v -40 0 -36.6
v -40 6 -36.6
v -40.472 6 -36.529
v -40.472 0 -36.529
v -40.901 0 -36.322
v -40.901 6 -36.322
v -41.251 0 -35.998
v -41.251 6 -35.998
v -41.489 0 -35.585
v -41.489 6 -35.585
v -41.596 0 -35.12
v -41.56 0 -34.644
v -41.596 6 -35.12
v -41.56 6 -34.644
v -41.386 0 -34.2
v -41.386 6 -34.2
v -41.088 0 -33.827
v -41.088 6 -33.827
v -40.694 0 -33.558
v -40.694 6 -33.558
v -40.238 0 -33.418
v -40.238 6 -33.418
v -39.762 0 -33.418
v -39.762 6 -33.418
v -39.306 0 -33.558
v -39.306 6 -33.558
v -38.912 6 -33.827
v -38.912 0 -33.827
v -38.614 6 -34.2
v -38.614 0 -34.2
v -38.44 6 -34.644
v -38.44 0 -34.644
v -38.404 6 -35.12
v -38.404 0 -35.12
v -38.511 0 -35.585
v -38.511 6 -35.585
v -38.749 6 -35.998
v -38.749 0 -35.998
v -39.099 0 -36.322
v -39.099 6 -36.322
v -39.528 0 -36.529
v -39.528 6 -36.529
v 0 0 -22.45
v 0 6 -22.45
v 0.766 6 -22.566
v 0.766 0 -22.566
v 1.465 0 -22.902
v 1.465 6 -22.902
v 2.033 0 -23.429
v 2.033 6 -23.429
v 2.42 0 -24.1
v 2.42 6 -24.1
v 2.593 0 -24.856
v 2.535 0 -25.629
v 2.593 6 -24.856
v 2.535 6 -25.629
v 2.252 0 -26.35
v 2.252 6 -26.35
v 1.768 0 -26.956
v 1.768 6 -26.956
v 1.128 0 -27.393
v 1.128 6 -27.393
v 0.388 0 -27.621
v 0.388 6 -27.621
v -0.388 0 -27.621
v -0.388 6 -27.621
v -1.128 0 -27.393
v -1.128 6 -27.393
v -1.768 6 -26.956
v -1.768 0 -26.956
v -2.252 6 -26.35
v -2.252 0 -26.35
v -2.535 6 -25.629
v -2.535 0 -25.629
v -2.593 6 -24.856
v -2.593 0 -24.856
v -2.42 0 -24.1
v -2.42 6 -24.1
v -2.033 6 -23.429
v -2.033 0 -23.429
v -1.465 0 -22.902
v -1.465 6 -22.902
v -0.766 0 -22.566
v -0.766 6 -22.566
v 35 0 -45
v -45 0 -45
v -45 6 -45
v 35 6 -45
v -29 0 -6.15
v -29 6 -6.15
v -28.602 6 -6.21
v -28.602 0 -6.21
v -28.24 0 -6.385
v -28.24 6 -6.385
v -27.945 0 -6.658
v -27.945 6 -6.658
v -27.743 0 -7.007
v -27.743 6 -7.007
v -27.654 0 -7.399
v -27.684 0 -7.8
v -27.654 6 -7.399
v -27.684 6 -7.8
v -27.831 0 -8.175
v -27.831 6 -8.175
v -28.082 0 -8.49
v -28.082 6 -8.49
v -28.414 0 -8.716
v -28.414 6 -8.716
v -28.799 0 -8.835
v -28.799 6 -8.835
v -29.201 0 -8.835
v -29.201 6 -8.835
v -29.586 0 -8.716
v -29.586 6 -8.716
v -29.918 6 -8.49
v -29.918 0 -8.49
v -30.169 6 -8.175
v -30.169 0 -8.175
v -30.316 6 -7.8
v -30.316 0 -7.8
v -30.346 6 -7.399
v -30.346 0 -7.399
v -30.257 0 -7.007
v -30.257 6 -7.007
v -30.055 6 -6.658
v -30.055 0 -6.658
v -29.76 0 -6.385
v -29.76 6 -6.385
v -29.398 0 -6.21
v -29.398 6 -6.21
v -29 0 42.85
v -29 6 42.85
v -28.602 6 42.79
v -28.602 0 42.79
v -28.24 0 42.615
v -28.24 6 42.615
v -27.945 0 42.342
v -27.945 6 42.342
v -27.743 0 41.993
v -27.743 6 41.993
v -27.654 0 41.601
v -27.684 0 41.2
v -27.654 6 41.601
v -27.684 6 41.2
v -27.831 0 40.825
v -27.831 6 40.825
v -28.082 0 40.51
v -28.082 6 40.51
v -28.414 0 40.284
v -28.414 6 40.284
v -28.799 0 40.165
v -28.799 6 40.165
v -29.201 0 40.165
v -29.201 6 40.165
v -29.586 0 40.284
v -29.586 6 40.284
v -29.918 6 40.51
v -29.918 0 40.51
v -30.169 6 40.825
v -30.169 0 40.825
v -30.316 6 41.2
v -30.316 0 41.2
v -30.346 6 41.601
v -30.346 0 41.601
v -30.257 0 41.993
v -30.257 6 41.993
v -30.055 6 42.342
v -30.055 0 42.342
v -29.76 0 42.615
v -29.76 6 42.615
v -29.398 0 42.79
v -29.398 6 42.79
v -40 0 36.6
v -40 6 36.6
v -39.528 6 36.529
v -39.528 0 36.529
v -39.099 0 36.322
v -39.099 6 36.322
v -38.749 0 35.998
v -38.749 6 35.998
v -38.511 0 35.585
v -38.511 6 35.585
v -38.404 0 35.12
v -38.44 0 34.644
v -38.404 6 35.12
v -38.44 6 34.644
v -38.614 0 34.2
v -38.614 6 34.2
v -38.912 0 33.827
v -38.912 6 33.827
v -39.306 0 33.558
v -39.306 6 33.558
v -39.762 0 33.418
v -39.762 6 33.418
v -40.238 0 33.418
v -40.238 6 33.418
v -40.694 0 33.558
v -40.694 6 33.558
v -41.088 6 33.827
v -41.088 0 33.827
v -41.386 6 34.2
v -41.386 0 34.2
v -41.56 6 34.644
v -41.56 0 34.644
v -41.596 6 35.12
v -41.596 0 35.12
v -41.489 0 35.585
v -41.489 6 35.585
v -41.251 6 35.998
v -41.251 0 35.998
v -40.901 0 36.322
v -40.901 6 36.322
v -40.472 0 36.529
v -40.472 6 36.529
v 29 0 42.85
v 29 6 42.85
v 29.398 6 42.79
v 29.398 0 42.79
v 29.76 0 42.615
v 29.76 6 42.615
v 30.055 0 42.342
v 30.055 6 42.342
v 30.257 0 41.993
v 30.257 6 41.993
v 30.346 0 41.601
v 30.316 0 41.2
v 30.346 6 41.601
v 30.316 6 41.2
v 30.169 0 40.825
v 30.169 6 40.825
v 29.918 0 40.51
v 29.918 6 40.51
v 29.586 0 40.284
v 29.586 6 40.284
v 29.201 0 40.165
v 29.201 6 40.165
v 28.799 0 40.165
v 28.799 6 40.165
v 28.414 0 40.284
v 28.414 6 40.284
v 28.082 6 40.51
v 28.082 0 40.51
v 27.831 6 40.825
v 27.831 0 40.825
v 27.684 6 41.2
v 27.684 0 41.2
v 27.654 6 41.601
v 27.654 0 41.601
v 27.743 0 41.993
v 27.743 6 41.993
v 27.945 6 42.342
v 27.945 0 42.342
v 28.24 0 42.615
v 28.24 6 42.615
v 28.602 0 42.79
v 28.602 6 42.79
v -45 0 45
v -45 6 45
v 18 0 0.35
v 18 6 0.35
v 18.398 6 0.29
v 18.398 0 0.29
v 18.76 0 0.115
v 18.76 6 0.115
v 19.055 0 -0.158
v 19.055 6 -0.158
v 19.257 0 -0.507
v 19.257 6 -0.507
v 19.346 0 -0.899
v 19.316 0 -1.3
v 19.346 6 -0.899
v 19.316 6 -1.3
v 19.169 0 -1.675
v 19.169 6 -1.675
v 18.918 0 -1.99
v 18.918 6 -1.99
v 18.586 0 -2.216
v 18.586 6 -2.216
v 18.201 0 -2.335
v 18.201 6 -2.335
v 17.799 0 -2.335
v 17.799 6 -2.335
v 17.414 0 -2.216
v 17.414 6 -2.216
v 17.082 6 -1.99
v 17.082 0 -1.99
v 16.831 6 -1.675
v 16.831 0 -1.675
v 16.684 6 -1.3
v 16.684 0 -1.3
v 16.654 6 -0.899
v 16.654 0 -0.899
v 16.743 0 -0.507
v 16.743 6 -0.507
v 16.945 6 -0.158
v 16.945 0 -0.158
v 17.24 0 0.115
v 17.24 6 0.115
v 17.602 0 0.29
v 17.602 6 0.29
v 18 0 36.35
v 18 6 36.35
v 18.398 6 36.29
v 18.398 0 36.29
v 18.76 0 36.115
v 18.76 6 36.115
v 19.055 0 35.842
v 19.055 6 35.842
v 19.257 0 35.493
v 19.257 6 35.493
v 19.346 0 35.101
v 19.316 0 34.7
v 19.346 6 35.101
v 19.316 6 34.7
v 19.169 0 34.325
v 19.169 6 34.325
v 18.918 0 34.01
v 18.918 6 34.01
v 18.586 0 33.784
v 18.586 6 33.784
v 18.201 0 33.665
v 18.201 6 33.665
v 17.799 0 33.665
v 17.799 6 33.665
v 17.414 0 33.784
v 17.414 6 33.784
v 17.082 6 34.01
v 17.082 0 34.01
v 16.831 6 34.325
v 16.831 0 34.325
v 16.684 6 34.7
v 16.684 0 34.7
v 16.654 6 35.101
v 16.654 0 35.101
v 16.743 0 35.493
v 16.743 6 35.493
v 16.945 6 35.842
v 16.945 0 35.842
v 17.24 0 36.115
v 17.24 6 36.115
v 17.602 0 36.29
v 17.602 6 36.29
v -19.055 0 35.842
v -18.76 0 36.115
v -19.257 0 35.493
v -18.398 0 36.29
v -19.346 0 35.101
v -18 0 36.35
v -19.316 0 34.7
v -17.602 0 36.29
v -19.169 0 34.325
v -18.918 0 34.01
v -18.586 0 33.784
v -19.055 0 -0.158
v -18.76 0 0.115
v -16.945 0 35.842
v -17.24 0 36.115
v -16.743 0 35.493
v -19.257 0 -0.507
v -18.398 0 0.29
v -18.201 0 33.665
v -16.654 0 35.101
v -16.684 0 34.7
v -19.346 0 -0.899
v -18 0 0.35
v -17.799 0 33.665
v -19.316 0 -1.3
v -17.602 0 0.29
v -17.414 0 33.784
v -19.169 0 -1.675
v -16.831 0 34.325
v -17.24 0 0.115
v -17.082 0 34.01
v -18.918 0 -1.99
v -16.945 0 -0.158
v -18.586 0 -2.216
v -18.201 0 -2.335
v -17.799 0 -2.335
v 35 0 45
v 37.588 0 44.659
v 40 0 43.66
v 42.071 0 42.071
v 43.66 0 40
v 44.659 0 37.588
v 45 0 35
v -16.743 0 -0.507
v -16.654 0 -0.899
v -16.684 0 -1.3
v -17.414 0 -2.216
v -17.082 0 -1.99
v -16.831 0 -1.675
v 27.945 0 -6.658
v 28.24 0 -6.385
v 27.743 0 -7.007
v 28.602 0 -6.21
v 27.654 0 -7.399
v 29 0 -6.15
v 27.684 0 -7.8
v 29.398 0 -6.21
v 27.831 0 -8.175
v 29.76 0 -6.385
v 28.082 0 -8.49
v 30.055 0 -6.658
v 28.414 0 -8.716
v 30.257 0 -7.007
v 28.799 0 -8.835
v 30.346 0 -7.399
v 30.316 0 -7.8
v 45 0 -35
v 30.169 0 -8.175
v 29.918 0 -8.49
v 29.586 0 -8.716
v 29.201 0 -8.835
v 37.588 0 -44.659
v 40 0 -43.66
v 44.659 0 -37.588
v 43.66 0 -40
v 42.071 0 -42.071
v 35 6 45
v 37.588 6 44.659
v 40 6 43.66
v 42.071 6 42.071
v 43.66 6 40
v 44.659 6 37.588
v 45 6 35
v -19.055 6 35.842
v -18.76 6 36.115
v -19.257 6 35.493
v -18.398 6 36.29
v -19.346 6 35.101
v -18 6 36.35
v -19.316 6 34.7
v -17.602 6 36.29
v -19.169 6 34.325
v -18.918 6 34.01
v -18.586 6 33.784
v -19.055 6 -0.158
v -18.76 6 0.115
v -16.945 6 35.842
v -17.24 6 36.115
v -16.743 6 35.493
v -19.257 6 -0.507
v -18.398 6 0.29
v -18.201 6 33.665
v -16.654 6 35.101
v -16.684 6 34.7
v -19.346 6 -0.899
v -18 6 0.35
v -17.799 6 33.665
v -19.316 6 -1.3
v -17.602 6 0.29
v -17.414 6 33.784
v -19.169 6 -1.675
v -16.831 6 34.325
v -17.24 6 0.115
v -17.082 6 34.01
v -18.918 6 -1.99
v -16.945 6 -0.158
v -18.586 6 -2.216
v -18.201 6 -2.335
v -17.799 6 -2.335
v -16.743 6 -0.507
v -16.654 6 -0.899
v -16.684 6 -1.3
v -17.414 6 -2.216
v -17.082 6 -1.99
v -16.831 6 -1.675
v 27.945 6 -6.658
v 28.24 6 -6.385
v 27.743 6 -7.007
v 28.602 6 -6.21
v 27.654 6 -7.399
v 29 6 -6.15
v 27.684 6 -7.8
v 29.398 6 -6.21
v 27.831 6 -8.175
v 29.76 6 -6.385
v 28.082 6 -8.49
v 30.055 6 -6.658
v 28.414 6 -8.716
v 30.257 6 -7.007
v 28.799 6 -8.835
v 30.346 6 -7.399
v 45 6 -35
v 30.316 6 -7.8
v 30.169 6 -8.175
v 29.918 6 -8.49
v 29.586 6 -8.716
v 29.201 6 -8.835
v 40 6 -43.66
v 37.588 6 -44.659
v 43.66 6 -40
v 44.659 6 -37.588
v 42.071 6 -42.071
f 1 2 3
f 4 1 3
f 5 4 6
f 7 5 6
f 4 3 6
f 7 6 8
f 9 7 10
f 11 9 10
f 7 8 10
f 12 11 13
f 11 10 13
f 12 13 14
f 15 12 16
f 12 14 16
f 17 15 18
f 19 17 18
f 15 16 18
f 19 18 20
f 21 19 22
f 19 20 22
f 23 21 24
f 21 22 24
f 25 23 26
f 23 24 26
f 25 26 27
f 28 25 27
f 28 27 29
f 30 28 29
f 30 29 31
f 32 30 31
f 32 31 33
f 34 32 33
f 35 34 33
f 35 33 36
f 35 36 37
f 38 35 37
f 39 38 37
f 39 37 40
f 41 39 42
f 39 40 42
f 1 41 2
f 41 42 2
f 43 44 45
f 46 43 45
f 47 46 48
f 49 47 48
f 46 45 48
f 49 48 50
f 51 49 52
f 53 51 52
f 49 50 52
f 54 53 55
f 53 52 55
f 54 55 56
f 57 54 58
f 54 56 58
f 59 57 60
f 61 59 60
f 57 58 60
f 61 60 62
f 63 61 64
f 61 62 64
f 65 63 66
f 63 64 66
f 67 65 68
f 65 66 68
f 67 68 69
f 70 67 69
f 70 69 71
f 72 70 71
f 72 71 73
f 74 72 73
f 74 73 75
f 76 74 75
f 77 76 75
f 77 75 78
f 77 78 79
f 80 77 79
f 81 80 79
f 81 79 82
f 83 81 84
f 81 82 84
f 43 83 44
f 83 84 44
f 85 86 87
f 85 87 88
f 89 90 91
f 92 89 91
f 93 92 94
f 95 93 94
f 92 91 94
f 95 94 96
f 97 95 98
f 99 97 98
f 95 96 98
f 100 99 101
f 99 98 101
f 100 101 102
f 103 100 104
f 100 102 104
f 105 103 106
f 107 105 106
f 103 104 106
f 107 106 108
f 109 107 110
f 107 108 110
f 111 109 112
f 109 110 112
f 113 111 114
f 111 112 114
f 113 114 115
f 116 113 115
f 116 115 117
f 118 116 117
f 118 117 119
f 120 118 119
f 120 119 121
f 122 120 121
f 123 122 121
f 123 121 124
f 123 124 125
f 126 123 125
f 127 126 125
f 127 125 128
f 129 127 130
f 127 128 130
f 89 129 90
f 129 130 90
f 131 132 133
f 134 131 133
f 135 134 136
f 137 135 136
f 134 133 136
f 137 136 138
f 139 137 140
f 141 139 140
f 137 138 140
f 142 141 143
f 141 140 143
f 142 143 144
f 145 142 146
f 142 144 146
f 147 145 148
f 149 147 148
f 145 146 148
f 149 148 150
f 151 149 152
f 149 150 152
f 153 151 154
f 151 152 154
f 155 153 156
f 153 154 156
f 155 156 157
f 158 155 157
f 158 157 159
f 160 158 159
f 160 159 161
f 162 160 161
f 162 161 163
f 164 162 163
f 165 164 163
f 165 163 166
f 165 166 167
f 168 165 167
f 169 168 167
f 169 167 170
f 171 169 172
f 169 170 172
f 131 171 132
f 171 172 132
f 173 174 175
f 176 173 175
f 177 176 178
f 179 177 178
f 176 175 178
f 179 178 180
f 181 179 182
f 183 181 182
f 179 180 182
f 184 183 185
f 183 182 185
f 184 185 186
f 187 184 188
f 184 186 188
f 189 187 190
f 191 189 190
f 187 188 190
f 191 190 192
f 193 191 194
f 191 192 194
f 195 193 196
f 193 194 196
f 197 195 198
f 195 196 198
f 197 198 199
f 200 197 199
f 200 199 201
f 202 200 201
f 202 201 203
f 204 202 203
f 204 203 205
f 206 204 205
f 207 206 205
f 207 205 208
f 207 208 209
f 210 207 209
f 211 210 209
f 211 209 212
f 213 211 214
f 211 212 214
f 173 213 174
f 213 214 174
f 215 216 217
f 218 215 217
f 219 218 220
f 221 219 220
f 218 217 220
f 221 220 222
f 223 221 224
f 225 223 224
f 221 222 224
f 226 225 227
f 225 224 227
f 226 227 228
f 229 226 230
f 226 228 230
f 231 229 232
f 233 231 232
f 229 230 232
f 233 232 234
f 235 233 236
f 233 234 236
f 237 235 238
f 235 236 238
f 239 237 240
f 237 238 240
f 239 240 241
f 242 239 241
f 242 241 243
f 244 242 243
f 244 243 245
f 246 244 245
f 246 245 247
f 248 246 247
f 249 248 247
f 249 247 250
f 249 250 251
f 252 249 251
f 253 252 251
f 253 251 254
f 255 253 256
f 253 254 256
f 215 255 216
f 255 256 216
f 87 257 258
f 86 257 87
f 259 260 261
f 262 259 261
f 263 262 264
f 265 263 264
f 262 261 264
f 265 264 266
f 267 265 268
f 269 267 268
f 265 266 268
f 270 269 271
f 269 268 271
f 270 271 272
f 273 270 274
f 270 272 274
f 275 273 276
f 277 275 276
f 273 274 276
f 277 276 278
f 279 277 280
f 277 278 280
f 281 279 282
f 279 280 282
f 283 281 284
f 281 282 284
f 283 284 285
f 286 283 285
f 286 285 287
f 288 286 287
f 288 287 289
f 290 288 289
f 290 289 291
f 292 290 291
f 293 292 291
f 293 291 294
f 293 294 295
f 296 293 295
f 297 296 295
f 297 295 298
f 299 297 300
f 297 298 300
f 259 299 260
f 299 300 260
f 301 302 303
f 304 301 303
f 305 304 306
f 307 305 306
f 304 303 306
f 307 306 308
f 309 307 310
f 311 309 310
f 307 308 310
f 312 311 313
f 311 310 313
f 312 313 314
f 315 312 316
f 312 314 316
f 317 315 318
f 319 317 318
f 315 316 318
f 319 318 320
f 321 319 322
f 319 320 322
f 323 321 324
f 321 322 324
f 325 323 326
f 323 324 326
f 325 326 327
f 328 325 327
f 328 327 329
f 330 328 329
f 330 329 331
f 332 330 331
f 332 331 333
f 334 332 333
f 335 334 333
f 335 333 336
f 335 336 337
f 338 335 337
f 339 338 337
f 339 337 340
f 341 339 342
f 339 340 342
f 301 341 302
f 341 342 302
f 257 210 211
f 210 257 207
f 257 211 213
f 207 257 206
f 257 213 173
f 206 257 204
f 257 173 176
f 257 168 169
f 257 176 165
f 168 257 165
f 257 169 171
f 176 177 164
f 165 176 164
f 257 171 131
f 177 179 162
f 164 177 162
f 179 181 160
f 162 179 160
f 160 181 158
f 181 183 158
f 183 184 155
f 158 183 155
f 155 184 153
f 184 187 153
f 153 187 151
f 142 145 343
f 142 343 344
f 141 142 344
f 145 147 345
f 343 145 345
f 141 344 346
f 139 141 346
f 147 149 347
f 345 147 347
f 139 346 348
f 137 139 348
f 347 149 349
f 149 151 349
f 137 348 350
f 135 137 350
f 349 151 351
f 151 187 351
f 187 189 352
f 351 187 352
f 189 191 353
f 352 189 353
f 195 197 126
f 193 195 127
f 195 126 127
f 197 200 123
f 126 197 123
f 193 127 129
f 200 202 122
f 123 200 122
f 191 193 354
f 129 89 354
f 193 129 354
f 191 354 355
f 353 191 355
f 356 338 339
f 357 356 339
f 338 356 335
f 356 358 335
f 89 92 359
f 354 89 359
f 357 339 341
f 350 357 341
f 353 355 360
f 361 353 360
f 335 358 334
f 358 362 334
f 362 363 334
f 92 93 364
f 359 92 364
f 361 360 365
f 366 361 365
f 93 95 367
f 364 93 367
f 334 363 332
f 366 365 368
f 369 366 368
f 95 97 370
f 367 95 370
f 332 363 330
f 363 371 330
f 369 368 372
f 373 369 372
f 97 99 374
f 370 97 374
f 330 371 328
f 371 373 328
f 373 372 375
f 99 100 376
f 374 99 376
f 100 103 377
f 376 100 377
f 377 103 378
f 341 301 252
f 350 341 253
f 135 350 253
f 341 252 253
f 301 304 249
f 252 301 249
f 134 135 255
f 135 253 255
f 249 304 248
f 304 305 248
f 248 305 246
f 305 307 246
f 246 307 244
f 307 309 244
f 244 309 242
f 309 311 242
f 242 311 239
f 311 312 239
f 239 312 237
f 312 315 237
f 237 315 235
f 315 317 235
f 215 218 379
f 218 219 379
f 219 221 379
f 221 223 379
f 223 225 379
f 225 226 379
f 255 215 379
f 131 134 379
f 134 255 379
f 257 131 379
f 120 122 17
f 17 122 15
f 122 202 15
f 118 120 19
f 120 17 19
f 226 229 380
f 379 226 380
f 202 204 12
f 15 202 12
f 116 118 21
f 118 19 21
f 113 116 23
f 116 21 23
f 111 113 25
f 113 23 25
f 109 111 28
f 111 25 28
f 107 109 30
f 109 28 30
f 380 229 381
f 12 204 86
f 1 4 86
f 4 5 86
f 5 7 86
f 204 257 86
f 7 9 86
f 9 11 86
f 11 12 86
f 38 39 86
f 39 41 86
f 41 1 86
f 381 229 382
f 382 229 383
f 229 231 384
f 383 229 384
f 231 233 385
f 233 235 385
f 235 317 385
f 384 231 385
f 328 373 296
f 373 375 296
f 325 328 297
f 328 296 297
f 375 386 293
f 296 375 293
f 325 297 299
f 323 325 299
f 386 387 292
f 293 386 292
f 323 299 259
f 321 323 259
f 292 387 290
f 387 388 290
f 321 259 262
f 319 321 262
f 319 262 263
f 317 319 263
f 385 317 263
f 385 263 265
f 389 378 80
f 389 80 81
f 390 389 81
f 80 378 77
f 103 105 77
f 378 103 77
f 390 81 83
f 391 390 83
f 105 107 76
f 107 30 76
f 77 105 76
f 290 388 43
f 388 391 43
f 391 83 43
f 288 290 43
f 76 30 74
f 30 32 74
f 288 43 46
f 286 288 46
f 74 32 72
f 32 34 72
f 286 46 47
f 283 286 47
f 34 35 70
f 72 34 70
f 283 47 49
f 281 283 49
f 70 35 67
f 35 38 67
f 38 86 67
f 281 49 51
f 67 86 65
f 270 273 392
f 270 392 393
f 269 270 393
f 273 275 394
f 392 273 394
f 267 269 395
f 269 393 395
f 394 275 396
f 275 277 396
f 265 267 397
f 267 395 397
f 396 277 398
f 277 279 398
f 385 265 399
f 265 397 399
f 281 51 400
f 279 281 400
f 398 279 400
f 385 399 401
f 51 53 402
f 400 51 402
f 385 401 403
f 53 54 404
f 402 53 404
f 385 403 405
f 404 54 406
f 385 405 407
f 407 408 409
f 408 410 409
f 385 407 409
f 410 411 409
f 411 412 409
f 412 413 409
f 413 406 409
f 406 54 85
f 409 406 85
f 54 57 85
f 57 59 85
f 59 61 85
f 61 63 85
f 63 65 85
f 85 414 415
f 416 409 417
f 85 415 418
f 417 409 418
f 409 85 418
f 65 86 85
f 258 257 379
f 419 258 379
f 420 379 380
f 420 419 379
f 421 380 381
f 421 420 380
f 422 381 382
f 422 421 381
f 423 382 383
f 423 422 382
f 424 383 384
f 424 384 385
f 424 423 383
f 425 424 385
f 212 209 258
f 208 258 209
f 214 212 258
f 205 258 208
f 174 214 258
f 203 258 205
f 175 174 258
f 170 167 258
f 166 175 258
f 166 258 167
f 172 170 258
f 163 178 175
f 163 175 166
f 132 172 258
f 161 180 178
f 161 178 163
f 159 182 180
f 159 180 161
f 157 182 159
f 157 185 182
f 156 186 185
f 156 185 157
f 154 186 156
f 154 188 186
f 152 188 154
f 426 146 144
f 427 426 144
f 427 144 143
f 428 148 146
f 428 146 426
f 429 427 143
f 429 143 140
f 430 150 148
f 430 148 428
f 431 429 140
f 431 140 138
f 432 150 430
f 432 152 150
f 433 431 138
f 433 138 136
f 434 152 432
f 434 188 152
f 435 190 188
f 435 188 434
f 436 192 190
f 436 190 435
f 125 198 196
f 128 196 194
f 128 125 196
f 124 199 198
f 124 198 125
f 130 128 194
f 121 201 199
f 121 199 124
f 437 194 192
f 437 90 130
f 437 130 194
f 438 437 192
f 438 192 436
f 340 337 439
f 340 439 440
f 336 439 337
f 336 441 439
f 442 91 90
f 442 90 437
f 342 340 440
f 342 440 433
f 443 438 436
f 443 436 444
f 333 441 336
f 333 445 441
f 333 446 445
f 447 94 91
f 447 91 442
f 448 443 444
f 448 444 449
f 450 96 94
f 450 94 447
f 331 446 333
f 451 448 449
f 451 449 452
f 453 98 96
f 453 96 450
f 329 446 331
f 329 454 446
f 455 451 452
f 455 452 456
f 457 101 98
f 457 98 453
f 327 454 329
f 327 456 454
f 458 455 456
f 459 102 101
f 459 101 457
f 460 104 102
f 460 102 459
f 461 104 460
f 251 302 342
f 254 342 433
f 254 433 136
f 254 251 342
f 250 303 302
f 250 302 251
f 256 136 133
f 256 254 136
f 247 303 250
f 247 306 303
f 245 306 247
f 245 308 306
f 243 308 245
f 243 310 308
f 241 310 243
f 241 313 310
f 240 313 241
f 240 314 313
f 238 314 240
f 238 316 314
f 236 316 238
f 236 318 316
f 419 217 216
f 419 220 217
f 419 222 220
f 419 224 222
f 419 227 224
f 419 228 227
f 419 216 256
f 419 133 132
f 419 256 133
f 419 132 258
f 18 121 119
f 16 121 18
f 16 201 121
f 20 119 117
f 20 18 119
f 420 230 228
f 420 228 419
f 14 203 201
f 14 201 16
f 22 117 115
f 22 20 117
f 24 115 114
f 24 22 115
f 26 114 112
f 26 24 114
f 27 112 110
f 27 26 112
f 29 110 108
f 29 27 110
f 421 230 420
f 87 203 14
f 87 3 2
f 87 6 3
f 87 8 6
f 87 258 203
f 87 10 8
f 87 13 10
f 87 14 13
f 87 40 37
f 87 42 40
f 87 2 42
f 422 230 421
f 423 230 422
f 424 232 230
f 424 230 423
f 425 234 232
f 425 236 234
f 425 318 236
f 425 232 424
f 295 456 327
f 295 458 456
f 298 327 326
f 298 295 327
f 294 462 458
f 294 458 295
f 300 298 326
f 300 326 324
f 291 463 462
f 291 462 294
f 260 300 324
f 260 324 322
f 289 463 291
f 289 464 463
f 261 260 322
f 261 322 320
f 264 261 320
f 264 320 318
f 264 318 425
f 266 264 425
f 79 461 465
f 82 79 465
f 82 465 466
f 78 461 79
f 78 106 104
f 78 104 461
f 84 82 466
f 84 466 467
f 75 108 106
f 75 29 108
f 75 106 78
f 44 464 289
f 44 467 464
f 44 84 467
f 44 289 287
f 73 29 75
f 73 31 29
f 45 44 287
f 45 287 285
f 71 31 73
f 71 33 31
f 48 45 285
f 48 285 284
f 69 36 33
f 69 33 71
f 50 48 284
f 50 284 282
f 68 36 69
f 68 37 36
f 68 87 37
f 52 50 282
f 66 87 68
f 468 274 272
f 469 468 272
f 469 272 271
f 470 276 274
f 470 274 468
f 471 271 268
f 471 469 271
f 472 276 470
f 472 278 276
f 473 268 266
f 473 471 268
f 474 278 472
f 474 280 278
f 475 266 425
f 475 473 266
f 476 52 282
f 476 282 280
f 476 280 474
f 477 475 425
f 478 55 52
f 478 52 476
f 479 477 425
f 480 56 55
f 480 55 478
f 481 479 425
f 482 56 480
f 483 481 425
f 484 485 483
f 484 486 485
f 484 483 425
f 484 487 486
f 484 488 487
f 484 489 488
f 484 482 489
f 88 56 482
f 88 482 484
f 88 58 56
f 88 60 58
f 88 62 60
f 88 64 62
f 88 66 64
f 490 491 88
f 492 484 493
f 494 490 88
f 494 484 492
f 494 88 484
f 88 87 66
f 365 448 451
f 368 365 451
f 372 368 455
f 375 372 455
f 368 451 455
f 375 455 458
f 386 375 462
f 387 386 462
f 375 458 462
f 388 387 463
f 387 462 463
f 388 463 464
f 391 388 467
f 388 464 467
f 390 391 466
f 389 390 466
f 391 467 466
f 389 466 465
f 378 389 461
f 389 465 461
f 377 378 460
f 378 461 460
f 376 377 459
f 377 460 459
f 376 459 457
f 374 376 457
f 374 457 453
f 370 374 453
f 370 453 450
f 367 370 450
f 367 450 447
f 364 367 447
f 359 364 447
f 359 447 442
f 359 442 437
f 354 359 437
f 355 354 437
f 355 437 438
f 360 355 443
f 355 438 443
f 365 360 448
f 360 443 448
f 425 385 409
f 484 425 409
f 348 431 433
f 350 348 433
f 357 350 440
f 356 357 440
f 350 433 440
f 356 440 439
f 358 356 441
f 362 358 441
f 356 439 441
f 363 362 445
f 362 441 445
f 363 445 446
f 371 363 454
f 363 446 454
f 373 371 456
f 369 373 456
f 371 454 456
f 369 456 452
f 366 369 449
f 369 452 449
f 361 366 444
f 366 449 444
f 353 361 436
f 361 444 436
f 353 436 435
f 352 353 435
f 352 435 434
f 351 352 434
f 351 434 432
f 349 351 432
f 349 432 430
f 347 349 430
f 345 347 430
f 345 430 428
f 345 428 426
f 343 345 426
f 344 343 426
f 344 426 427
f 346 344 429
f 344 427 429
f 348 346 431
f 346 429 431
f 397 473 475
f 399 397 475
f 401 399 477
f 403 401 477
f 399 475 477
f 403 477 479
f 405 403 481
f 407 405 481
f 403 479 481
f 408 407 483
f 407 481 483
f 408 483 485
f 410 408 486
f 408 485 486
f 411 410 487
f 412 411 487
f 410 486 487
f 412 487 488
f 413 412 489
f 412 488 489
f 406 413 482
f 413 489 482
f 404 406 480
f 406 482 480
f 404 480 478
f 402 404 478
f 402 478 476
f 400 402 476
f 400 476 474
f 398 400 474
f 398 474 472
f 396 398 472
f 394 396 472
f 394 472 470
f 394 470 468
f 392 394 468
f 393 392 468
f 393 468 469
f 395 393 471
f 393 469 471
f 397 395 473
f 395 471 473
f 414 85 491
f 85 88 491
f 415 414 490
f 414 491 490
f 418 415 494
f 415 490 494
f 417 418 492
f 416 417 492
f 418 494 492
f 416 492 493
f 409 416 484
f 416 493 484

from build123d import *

# Parameters (mm, degrees)
SKETCH_1_W          = 90
SKETCH_1_H          = 90
EXTRUDE_1_DEPTH     = 6
SKETCH_2_R          = 1.35
CUT_EXTRUDE_1_DEPTH = 6
SKETCH_3_R          = 2.6
CUT_EXTRUDE_2_DEPTH = 6
SKETCH_4_R          = 1.6
CUT_EXTRUDE_3_DEPTH = 6
FILLET_1_R          = 10


with BuildPart() as part:
    # 草图1 → 凸台-拉伸1 (new body)
    with BuildSketch(Plane(origin=(0, 0, 0), x_dir=(1, 0, 0), z_dir=(0, 1, 0))):
        Rectangle(SKETCH_1_W, SKETCH_1_H)
    extrude(amount=EXTRUDE_1_DEPTH)

    # 草图2 → 切除-拉伸1 (cut)
    with BuildSketch(Plane(origin=(0, 6, 0), x_dir=(1, 0, 0), z_dir=(0, 1, 0))):
        with Locations(Location((-29, 7.5, 0), (0, 0, 270))):
            Circle(SKETCH_2_R)
        with Locations(Location((-29, -41.5, 0), (0, 0, 270))):
            Circle(SKETCH_2_R)
        with Locations(Location((-18, 1, 0), (0, 0, 270))):
            Circle(SKETCH_2_R)
        with Locations(Location((-18, -35, 0), (0, 0, 270))):
            Circle(SKETCH_2_R)
        with Locations(Location((18, -35, 0), (0, 0, 270))):
            Circle(SKETCH_2_R)
        with Locations(Location((29, -41.5, 0), (0, 0, 270))):
            Circle(SKETCH_2_R)
        with Locations(Location((18, 1, 0), (0, 0, 270))):
            Circle(SKETCH_2_R)
        with Locations(Location((29, 7.5, 0), (0, 0, 270))):
            Circle(SKETCH_2_R)
    extrude(amount=-CUT_EXTRUDE_1_DEPTH, mode=Mode.SUBTRACT)

    # 草图3 → 切除-拉伸2 (cut)
    with BuildSketch(Plane(origin=(0, 6, 0), x_dir=(1, 0, 0), z_dir=(0, 1, 0))):
        with Locations(Location((0, 25.05, 0), (0, 0, 270))):
            Circle(SKETCH_3_R)
    extrude(amount=-CUT_EXTRUDE_2_DEPTH, mode=Mode.SUBTRACT)

    # 草图4 → 切除-拉伸3 (cut)
    with BuildSketch(Plane(origin=(0, 6, 0), x_dir=(1, 0, 0), z_dir=(0, 1, 0))):
        with Locations(Location((-40, -35, 0), (0, 0, 270))):
            Circle(SKETCH_4_R)
        with Locations(Location((-40, 35, 0), (0, 0, 90))):
            Circle(SKETCH_4_R)
    extrude(amount=-CUT_EXTRUDE_3_DEPTH, mode=Mode.SUBTRACT)

    # 圆角1
    fillet_1_edges = [part.edges().sort_by_distance(p)[0] for p in [
        (45, 3, 45),
        (45, 3, -45),
    ]]
    fillet(fillet_1_edges, radius=FILLET_1_R)


solid = part.part
